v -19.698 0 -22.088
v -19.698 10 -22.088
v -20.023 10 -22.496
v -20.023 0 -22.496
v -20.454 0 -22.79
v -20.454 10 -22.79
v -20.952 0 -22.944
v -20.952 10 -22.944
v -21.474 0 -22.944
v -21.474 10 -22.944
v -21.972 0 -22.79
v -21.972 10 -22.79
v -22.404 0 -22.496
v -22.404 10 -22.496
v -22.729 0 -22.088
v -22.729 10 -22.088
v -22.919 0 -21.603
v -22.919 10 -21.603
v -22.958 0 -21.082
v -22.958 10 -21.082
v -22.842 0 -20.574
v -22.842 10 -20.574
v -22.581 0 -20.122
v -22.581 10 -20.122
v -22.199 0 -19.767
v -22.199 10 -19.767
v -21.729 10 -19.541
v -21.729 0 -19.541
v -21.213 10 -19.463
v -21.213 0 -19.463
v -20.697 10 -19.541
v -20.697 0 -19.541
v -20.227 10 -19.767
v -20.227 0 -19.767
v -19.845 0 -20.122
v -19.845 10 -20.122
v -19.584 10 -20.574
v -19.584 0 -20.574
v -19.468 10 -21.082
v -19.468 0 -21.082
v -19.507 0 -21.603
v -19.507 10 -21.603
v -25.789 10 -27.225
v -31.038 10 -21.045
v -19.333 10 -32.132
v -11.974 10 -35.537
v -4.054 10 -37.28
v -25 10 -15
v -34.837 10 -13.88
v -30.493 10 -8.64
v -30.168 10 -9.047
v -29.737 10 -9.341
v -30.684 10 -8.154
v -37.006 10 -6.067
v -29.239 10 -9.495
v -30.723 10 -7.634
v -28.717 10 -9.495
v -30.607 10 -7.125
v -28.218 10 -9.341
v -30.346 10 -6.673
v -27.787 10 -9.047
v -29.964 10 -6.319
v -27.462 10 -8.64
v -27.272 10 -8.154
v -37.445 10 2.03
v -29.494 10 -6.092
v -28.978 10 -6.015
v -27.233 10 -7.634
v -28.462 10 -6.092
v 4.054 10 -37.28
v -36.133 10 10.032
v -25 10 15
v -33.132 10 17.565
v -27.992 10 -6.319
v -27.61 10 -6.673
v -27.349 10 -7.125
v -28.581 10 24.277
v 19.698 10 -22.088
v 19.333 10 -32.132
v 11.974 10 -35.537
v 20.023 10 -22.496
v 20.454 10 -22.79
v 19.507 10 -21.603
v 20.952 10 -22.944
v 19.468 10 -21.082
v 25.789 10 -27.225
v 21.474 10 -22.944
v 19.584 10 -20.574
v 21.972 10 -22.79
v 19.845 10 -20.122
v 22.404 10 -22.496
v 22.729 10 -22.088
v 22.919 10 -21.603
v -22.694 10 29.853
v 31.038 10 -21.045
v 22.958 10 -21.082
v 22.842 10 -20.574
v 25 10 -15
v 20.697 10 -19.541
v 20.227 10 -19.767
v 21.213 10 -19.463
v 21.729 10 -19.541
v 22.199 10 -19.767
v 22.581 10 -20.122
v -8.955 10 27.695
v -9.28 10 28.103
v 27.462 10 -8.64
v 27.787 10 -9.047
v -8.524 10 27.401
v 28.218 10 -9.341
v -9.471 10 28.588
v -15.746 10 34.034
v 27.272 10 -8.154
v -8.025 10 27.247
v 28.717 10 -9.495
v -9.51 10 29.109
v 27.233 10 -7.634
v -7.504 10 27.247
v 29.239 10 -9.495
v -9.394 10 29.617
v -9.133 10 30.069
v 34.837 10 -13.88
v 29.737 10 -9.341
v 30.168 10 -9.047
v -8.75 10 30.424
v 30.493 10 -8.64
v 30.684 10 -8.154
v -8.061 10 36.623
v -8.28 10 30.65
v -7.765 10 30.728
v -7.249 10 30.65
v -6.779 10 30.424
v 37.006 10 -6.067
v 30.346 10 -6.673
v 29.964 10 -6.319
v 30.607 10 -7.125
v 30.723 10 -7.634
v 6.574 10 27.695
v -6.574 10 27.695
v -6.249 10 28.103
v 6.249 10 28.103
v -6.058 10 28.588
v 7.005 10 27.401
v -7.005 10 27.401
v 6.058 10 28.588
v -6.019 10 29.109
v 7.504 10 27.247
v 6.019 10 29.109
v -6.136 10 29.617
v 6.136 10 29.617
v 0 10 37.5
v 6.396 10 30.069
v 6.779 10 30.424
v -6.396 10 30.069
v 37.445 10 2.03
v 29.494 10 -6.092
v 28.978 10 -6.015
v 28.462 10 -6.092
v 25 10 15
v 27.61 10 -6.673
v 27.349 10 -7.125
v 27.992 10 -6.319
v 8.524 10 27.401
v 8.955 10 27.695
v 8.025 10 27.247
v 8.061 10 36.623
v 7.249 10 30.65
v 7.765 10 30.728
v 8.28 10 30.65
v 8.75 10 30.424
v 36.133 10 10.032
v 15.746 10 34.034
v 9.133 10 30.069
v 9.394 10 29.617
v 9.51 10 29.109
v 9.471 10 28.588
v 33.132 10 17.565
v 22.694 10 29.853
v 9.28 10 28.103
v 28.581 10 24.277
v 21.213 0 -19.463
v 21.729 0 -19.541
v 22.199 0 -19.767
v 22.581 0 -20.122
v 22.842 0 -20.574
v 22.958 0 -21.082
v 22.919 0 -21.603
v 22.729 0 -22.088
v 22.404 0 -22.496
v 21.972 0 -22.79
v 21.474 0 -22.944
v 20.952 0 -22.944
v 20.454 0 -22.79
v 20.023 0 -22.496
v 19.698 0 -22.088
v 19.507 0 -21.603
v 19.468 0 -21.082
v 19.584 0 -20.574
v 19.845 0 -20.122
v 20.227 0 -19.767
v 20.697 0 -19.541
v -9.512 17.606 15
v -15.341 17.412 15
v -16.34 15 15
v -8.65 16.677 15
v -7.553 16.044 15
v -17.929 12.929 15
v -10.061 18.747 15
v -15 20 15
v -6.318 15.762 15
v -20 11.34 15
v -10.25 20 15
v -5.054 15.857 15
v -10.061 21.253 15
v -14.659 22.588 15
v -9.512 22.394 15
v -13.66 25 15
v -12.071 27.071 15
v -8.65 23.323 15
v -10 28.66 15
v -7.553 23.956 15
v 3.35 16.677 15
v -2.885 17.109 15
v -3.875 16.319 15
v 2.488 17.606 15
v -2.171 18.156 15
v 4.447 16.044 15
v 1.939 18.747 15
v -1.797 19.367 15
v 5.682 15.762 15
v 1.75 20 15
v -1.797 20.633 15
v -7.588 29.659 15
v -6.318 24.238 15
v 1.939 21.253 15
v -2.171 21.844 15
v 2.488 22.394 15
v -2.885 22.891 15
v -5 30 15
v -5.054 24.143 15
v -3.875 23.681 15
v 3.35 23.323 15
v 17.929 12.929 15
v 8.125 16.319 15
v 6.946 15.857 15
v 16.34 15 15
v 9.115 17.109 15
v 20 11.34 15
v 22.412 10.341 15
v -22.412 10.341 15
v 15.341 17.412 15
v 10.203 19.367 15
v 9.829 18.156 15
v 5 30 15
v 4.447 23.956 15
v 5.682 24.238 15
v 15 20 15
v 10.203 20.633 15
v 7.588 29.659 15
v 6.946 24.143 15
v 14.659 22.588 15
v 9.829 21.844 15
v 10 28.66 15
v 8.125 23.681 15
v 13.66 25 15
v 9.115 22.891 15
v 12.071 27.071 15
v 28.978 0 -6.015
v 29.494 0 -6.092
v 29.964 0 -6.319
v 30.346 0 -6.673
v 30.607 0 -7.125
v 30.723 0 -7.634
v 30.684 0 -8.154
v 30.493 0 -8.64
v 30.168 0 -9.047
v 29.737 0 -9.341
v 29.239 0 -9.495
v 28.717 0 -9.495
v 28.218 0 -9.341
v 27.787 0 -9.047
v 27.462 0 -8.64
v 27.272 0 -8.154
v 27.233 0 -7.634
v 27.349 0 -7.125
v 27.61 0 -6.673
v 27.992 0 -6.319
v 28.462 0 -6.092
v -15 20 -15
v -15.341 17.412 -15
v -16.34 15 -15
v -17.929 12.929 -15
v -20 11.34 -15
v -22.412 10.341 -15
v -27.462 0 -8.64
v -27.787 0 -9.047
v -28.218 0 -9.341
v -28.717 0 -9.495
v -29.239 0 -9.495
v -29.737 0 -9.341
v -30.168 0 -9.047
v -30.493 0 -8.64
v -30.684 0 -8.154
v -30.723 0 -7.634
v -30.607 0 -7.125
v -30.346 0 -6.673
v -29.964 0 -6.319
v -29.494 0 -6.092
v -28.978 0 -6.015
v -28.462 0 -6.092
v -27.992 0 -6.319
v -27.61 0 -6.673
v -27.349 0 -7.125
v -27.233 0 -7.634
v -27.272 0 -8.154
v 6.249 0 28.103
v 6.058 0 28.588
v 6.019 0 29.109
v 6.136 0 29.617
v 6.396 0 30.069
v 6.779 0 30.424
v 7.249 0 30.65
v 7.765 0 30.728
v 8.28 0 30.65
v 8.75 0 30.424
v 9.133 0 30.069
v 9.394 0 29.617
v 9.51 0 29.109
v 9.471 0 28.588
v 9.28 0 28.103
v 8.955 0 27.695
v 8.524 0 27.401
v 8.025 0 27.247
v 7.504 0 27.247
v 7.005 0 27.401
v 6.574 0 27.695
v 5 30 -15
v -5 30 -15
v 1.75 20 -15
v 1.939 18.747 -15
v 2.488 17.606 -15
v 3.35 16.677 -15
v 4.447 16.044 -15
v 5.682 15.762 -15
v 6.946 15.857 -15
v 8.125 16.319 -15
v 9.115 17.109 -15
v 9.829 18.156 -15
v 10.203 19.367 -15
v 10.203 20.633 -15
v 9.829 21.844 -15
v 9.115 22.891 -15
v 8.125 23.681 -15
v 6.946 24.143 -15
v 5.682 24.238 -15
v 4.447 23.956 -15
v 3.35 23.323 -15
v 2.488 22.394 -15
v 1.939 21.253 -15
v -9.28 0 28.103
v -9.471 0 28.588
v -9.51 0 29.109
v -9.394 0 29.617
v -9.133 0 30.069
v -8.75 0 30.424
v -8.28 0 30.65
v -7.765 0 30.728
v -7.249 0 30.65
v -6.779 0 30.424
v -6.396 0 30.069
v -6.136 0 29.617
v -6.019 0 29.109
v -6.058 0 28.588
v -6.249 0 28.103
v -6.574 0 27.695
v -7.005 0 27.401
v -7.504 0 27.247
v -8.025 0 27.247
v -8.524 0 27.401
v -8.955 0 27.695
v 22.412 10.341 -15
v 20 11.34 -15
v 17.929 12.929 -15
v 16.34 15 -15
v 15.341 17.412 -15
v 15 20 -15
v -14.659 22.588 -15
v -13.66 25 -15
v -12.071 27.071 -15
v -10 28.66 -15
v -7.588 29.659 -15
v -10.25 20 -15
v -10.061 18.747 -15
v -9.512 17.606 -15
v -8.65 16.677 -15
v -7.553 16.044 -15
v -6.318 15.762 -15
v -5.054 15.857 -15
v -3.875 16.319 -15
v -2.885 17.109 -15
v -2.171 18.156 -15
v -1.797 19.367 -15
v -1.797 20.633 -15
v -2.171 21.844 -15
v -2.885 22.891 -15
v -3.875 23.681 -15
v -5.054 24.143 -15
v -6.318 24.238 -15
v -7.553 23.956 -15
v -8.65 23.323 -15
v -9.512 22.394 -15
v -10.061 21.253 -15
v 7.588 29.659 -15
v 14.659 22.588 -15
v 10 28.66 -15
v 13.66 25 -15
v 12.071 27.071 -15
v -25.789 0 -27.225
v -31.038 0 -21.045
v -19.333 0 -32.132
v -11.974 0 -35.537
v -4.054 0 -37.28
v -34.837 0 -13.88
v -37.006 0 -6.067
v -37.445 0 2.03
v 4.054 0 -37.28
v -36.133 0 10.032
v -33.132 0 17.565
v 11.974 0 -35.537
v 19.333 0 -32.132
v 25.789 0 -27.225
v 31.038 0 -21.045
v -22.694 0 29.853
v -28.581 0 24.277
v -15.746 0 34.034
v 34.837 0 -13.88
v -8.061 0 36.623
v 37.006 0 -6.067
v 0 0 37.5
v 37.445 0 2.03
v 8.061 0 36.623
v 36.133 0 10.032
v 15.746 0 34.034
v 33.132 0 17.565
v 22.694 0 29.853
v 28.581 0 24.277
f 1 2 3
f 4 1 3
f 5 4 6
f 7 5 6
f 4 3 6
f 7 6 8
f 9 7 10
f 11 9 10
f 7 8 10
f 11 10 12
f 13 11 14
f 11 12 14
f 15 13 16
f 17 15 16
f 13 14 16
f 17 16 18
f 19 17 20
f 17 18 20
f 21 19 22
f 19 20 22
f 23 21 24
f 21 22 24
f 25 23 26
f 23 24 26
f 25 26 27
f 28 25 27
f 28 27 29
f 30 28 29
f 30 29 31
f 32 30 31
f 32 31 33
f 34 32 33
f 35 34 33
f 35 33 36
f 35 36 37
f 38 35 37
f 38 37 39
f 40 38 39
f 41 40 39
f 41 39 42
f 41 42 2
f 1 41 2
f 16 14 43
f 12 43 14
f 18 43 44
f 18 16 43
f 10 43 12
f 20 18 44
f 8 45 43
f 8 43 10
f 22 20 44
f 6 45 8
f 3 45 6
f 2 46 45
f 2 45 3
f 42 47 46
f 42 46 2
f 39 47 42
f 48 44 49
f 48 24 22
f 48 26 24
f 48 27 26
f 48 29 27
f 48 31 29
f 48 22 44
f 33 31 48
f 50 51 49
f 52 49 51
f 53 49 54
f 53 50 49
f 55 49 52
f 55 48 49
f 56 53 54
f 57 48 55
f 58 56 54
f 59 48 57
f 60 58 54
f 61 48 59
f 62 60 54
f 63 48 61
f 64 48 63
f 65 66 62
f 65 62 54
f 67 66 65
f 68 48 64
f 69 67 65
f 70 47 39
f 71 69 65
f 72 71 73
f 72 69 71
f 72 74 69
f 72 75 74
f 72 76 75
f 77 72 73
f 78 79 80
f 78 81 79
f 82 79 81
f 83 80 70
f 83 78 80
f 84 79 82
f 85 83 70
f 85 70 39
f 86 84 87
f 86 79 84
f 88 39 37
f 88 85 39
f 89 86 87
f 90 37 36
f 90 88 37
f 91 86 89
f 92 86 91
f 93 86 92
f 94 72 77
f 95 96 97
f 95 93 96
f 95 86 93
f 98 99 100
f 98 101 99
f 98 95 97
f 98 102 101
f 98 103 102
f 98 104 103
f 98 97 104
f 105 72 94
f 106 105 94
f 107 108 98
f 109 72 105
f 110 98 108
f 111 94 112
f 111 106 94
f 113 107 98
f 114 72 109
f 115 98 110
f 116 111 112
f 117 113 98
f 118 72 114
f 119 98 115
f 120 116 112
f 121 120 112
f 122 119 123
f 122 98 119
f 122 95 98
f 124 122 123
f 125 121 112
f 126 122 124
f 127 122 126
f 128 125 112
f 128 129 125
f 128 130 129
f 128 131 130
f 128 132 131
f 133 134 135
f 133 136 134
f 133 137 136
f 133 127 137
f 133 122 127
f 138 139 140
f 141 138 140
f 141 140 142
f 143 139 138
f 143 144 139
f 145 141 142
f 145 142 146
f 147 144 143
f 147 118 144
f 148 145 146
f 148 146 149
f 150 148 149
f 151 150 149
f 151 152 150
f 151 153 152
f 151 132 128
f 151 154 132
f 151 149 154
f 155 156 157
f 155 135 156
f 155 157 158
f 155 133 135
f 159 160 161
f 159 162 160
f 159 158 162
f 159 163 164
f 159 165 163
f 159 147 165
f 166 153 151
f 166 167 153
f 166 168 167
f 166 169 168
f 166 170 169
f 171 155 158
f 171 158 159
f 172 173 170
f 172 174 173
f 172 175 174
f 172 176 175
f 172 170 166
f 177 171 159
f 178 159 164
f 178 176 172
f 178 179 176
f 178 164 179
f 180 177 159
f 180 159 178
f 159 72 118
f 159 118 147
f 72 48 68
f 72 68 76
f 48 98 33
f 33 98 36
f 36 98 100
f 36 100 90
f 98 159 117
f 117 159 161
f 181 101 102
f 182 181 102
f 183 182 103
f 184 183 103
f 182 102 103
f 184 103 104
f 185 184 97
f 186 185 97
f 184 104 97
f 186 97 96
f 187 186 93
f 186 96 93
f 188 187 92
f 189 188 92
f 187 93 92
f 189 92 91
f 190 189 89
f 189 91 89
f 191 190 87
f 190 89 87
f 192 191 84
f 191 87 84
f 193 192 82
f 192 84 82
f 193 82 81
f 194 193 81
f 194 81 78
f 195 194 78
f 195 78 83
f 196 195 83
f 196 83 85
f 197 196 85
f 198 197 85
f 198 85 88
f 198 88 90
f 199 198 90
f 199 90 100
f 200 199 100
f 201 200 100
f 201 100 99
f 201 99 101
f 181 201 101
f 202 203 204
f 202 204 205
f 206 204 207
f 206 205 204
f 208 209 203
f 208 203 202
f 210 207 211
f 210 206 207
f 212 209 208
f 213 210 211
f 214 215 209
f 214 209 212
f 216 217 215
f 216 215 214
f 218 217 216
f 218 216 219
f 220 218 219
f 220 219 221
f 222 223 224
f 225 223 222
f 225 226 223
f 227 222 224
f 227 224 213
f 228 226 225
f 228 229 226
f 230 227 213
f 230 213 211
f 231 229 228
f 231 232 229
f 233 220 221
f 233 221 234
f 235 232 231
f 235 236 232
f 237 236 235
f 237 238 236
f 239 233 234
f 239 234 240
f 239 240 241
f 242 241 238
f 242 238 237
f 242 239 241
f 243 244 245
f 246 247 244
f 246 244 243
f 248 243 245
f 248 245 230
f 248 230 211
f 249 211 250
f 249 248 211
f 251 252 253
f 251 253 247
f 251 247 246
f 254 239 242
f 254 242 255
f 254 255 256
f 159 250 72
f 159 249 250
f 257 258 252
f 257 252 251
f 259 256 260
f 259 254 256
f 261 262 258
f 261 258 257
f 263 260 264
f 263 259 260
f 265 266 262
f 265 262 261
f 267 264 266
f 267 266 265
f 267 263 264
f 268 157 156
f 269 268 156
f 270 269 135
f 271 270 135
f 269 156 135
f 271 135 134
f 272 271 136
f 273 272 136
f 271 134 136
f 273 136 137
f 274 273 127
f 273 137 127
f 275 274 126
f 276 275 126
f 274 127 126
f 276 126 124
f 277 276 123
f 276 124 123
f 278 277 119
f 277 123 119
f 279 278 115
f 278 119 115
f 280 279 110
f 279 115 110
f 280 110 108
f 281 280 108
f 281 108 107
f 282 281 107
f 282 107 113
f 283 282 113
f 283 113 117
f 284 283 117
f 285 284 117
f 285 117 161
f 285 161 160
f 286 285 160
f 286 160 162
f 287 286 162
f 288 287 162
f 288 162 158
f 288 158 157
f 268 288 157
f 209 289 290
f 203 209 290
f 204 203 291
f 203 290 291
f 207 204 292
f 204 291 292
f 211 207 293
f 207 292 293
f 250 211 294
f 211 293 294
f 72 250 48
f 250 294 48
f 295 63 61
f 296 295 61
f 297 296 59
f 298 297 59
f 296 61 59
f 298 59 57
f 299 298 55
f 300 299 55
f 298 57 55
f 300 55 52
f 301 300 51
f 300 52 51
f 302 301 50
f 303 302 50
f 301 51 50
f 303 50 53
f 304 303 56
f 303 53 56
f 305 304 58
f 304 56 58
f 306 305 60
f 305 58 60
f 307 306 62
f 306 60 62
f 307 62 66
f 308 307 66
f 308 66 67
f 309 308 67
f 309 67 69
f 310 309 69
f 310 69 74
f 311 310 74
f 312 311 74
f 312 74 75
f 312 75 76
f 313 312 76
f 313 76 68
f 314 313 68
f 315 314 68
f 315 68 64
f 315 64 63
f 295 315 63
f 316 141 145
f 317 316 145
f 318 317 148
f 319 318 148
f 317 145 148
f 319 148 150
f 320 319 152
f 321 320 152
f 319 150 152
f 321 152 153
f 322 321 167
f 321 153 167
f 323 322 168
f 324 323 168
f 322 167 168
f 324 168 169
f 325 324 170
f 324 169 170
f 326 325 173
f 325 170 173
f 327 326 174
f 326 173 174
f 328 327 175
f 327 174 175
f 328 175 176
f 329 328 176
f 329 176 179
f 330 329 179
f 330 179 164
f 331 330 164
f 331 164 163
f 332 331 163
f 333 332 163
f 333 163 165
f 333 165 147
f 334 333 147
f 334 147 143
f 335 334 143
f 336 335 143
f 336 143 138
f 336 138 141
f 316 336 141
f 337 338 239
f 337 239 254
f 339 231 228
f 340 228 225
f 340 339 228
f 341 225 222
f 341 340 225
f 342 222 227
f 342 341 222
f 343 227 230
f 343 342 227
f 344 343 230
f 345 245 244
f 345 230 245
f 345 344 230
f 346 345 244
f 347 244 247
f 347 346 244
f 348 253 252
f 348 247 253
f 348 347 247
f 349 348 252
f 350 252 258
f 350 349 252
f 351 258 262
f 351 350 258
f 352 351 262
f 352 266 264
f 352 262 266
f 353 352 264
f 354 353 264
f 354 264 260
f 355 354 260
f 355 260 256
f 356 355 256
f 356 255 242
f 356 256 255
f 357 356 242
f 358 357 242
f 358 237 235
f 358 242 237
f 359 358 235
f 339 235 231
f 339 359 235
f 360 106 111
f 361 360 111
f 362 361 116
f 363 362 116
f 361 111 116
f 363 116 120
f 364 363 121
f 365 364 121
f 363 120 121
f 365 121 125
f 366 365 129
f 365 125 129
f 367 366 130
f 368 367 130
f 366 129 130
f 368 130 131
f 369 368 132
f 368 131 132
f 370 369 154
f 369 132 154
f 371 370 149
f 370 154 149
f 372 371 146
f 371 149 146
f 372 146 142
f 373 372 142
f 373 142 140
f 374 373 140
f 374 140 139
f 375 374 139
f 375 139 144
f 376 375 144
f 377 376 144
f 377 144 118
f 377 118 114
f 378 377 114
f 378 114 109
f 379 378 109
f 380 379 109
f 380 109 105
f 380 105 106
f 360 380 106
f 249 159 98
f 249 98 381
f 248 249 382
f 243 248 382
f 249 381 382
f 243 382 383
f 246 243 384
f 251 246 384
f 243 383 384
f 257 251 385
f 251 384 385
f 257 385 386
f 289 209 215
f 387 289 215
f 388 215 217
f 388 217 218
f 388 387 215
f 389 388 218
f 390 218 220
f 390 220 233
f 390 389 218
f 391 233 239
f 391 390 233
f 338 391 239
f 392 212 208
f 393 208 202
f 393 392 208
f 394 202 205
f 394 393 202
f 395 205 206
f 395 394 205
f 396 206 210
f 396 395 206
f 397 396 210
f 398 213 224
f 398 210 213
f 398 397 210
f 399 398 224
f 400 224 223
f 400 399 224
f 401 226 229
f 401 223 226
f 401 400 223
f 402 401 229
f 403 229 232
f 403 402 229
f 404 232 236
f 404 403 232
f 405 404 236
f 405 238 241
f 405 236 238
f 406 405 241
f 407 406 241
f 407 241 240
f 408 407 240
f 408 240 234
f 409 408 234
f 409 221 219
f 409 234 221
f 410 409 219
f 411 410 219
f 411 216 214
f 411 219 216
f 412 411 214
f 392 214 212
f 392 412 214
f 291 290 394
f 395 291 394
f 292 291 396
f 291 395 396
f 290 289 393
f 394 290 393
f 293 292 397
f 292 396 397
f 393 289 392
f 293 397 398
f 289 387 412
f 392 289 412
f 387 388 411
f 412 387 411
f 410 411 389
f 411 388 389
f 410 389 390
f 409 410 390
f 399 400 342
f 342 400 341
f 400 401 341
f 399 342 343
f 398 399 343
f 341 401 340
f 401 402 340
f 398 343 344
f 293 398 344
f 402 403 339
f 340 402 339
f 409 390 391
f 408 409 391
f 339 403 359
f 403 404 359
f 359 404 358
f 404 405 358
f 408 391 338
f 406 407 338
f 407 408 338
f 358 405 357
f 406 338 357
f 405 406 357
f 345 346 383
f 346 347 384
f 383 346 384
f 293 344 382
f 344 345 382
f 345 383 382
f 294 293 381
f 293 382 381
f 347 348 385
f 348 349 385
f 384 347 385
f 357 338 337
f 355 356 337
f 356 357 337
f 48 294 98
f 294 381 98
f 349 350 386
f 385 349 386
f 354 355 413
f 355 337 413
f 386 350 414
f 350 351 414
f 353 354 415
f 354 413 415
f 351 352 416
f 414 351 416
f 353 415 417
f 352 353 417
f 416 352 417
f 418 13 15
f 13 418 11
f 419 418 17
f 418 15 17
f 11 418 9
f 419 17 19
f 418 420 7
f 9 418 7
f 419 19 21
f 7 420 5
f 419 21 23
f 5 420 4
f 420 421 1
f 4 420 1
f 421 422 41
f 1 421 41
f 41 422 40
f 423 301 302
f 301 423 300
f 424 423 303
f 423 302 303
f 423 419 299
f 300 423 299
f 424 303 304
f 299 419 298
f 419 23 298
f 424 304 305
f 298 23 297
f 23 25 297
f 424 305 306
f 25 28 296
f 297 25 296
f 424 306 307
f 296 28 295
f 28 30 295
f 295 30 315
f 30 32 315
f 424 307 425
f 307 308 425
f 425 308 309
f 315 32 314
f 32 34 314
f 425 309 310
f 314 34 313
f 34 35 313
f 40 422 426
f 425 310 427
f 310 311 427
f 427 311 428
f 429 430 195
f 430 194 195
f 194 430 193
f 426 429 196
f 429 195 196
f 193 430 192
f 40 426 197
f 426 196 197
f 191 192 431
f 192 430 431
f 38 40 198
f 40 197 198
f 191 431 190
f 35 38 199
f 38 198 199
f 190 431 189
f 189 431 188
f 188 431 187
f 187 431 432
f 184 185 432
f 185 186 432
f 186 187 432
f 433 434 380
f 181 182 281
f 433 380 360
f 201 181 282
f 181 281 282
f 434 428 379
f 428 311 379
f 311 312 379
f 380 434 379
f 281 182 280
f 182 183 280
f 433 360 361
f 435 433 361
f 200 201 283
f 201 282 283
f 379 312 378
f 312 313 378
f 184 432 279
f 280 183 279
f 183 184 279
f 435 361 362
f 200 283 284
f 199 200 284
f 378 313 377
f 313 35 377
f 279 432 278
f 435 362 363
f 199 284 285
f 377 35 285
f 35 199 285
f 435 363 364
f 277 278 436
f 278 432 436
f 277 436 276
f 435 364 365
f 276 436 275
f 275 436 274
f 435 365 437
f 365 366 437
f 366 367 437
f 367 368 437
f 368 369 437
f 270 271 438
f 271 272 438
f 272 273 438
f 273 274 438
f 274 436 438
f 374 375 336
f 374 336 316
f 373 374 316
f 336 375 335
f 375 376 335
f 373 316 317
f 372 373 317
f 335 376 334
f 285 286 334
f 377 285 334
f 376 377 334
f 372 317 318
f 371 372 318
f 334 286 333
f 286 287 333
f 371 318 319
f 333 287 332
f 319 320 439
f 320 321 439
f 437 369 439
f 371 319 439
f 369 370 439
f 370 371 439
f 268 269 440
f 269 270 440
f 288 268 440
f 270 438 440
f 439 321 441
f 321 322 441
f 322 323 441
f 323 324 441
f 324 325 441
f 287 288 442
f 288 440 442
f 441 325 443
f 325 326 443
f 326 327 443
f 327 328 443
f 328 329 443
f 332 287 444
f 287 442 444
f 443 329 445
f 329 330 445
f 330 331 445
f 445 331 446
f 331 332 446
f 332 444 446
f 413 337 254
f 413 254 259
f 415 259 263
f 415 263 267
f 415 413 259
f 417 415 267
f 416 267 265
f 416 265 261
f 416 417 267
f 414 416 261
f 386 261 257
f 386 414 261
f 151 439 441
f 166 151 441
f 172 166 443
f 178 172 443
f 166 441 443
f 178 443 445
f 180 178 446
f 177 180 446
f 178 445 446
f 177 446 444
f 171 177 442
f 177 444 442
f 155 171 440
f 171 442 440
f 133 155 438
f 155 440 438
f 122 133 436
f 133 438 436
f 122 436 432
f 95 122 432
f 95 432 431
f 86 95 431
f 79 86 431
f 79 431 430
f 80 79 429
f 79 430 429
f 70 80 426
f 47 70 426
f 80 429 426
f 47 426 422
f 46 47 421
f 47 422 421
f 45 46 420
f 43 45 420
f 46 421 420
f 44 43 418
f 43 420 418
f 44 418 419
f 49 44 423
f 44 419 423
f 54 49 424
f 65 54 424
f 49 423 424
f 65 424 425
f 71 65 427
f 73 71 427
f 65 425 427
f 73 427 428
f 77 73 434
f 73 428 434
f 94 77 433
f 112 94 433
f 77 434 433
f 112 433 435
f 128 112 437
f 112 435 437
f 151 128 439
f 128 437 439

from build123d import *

# Parameters (mm, degrees)
SKETCH1_R           = 37.5
BOSS_EXTRUDE1_DEPTH = 10
SKETCH9_R           = 1.75
CUT_EXTRUDE5_DEPTH  = 54.967582862
CIRPATTERN3_COUNT   = 3
SKETCH10_W          = 30
SKETCH10_H          = 30
BOSS_EXTRUDE2_DEPTH = 20
SKETCH11_R          = 4.25
CUT_EXTRUDE6_DEPTH  = 72.151247354
FILLET1_START       = -15
FILLET1_DEPTH       = 30
FILLET1_2_DEPTH     = 30


with BuildPart() as part:
    # Sketch1 → Boss-Extrude1 (new body)
    with BuildSketch(Plane(origin=(0, 0, 0), x_dir=(1, 0, 0), z_dir=(0, 1, 0))):
        with Locations(Location((0, 0, 0), (0, 0, 270))):
            Circle(SKETCH1_R)
    extrude(amount=BOSS_EXTRUDE1_DEPTH)

    # Sketch9 → Cut-Extrude5 (cut, through all)
    with BuildSketch(Plane(origin=(0, 10, 0), x_dir=(1, 0, 0), z_dir=(0, 1, 0))):
        with Locations(Location((21.213203436, 21.213203436, 0), (0, 0, 270))):
            Circle(SKETCH9_R)
        with Locations(Location((28.977774789, 7.764571353, 0), (0, 0, 270))):
            Circle(SKETCH9_R)
    cut_extrude5 = extrude(amount=-CUT_EXTRUDE5_DEPTH, mode=Mode.SUBTRACT)

    # CirPattern3: Cut-Extrude5 ×3 about axis
    cirpattern3_axis = Axis((0, 0, 0), (0, 1, 0))
    for i in range(1, CIRPATTERN3_COUNT):
        add(cut_extrude5.rotate(cirpattern3_axis, i * 360 / CIRPATTERN3_COUNT), mode=Mode.SUBTRACT)

    # Sketch10 → Boss-Extrude2 (add)
    with BuildSketch(Plane(origin=(0, 10, 0), x_dir=(1, 0, 0), z_dir=(0, 1, 0))):
        Rectangle(SKETCH10_W, SKETCH10_H)
    extrude(amount=BOSS_EXTRUDE2_DEPTH)

    # Sketch11 → Cut-Extrude6 (cut, through all)
    with BuildSketch(Plane.XY.offset(-15)):
        with Locations(Location((6, 20, 0), (0, 0, 180))):
            Circle(SKETCH11_R)
        with Locations(Location((-6, 20, 0), (0, 0, 180))):
            Circle(SKETCH11_R)
    extrude(amount=CUT_EXTRUDE6_DEPTH, mode=Mode.SUBTRACT)

    # Fillet1: read off the stored shape, not the designer's step
    # Fillet1 outline → Fillet1 (cut)
    with BuildSketch(Plane.XY.offset(FILLET1_START)):
        with BuildLine():
            ThreePointArc((5, 30), (12.071067812, 27.071067812), (15, 20))
            Line((15, 20), (15, 30))
            Line((15, 30), (5, 30))
        make_face()
        with BuildLine():
            ThreePointArc((-15, 20), (-12.071067812, 27.071067812), (-5, 30))
            Line((-5, 30), (-15, 30))
            Line((-15, 30), (-15, 20))
        make_face()
    extrude(amount=FILLET1_DEPTH, mode=Mode.SUBTRACT)

    # Fillet1 2 outline → Fillet1 2 (add)
    with BuildSketch(Plane.XY.offset(FILLET1_START)):
        with BuildLine():
            ThreePointArc((25, 10), (17.928932188, 12.928932188), (15, 20))
            Line((15, 20), (15, 10))
            Line((15, 10), (25, 10))
        make_face()
        with BuildLine():
            Line((-25, 10), (-15, 10))
            Line((-15, 10), (-15, 20))
            ThreePointArc((-15, 20), (-17.928932188, 12.928932188), (-25, 10))
        make_face()
    extrude(amount=FILLET1_2_DEPTH)


solid = part.part
